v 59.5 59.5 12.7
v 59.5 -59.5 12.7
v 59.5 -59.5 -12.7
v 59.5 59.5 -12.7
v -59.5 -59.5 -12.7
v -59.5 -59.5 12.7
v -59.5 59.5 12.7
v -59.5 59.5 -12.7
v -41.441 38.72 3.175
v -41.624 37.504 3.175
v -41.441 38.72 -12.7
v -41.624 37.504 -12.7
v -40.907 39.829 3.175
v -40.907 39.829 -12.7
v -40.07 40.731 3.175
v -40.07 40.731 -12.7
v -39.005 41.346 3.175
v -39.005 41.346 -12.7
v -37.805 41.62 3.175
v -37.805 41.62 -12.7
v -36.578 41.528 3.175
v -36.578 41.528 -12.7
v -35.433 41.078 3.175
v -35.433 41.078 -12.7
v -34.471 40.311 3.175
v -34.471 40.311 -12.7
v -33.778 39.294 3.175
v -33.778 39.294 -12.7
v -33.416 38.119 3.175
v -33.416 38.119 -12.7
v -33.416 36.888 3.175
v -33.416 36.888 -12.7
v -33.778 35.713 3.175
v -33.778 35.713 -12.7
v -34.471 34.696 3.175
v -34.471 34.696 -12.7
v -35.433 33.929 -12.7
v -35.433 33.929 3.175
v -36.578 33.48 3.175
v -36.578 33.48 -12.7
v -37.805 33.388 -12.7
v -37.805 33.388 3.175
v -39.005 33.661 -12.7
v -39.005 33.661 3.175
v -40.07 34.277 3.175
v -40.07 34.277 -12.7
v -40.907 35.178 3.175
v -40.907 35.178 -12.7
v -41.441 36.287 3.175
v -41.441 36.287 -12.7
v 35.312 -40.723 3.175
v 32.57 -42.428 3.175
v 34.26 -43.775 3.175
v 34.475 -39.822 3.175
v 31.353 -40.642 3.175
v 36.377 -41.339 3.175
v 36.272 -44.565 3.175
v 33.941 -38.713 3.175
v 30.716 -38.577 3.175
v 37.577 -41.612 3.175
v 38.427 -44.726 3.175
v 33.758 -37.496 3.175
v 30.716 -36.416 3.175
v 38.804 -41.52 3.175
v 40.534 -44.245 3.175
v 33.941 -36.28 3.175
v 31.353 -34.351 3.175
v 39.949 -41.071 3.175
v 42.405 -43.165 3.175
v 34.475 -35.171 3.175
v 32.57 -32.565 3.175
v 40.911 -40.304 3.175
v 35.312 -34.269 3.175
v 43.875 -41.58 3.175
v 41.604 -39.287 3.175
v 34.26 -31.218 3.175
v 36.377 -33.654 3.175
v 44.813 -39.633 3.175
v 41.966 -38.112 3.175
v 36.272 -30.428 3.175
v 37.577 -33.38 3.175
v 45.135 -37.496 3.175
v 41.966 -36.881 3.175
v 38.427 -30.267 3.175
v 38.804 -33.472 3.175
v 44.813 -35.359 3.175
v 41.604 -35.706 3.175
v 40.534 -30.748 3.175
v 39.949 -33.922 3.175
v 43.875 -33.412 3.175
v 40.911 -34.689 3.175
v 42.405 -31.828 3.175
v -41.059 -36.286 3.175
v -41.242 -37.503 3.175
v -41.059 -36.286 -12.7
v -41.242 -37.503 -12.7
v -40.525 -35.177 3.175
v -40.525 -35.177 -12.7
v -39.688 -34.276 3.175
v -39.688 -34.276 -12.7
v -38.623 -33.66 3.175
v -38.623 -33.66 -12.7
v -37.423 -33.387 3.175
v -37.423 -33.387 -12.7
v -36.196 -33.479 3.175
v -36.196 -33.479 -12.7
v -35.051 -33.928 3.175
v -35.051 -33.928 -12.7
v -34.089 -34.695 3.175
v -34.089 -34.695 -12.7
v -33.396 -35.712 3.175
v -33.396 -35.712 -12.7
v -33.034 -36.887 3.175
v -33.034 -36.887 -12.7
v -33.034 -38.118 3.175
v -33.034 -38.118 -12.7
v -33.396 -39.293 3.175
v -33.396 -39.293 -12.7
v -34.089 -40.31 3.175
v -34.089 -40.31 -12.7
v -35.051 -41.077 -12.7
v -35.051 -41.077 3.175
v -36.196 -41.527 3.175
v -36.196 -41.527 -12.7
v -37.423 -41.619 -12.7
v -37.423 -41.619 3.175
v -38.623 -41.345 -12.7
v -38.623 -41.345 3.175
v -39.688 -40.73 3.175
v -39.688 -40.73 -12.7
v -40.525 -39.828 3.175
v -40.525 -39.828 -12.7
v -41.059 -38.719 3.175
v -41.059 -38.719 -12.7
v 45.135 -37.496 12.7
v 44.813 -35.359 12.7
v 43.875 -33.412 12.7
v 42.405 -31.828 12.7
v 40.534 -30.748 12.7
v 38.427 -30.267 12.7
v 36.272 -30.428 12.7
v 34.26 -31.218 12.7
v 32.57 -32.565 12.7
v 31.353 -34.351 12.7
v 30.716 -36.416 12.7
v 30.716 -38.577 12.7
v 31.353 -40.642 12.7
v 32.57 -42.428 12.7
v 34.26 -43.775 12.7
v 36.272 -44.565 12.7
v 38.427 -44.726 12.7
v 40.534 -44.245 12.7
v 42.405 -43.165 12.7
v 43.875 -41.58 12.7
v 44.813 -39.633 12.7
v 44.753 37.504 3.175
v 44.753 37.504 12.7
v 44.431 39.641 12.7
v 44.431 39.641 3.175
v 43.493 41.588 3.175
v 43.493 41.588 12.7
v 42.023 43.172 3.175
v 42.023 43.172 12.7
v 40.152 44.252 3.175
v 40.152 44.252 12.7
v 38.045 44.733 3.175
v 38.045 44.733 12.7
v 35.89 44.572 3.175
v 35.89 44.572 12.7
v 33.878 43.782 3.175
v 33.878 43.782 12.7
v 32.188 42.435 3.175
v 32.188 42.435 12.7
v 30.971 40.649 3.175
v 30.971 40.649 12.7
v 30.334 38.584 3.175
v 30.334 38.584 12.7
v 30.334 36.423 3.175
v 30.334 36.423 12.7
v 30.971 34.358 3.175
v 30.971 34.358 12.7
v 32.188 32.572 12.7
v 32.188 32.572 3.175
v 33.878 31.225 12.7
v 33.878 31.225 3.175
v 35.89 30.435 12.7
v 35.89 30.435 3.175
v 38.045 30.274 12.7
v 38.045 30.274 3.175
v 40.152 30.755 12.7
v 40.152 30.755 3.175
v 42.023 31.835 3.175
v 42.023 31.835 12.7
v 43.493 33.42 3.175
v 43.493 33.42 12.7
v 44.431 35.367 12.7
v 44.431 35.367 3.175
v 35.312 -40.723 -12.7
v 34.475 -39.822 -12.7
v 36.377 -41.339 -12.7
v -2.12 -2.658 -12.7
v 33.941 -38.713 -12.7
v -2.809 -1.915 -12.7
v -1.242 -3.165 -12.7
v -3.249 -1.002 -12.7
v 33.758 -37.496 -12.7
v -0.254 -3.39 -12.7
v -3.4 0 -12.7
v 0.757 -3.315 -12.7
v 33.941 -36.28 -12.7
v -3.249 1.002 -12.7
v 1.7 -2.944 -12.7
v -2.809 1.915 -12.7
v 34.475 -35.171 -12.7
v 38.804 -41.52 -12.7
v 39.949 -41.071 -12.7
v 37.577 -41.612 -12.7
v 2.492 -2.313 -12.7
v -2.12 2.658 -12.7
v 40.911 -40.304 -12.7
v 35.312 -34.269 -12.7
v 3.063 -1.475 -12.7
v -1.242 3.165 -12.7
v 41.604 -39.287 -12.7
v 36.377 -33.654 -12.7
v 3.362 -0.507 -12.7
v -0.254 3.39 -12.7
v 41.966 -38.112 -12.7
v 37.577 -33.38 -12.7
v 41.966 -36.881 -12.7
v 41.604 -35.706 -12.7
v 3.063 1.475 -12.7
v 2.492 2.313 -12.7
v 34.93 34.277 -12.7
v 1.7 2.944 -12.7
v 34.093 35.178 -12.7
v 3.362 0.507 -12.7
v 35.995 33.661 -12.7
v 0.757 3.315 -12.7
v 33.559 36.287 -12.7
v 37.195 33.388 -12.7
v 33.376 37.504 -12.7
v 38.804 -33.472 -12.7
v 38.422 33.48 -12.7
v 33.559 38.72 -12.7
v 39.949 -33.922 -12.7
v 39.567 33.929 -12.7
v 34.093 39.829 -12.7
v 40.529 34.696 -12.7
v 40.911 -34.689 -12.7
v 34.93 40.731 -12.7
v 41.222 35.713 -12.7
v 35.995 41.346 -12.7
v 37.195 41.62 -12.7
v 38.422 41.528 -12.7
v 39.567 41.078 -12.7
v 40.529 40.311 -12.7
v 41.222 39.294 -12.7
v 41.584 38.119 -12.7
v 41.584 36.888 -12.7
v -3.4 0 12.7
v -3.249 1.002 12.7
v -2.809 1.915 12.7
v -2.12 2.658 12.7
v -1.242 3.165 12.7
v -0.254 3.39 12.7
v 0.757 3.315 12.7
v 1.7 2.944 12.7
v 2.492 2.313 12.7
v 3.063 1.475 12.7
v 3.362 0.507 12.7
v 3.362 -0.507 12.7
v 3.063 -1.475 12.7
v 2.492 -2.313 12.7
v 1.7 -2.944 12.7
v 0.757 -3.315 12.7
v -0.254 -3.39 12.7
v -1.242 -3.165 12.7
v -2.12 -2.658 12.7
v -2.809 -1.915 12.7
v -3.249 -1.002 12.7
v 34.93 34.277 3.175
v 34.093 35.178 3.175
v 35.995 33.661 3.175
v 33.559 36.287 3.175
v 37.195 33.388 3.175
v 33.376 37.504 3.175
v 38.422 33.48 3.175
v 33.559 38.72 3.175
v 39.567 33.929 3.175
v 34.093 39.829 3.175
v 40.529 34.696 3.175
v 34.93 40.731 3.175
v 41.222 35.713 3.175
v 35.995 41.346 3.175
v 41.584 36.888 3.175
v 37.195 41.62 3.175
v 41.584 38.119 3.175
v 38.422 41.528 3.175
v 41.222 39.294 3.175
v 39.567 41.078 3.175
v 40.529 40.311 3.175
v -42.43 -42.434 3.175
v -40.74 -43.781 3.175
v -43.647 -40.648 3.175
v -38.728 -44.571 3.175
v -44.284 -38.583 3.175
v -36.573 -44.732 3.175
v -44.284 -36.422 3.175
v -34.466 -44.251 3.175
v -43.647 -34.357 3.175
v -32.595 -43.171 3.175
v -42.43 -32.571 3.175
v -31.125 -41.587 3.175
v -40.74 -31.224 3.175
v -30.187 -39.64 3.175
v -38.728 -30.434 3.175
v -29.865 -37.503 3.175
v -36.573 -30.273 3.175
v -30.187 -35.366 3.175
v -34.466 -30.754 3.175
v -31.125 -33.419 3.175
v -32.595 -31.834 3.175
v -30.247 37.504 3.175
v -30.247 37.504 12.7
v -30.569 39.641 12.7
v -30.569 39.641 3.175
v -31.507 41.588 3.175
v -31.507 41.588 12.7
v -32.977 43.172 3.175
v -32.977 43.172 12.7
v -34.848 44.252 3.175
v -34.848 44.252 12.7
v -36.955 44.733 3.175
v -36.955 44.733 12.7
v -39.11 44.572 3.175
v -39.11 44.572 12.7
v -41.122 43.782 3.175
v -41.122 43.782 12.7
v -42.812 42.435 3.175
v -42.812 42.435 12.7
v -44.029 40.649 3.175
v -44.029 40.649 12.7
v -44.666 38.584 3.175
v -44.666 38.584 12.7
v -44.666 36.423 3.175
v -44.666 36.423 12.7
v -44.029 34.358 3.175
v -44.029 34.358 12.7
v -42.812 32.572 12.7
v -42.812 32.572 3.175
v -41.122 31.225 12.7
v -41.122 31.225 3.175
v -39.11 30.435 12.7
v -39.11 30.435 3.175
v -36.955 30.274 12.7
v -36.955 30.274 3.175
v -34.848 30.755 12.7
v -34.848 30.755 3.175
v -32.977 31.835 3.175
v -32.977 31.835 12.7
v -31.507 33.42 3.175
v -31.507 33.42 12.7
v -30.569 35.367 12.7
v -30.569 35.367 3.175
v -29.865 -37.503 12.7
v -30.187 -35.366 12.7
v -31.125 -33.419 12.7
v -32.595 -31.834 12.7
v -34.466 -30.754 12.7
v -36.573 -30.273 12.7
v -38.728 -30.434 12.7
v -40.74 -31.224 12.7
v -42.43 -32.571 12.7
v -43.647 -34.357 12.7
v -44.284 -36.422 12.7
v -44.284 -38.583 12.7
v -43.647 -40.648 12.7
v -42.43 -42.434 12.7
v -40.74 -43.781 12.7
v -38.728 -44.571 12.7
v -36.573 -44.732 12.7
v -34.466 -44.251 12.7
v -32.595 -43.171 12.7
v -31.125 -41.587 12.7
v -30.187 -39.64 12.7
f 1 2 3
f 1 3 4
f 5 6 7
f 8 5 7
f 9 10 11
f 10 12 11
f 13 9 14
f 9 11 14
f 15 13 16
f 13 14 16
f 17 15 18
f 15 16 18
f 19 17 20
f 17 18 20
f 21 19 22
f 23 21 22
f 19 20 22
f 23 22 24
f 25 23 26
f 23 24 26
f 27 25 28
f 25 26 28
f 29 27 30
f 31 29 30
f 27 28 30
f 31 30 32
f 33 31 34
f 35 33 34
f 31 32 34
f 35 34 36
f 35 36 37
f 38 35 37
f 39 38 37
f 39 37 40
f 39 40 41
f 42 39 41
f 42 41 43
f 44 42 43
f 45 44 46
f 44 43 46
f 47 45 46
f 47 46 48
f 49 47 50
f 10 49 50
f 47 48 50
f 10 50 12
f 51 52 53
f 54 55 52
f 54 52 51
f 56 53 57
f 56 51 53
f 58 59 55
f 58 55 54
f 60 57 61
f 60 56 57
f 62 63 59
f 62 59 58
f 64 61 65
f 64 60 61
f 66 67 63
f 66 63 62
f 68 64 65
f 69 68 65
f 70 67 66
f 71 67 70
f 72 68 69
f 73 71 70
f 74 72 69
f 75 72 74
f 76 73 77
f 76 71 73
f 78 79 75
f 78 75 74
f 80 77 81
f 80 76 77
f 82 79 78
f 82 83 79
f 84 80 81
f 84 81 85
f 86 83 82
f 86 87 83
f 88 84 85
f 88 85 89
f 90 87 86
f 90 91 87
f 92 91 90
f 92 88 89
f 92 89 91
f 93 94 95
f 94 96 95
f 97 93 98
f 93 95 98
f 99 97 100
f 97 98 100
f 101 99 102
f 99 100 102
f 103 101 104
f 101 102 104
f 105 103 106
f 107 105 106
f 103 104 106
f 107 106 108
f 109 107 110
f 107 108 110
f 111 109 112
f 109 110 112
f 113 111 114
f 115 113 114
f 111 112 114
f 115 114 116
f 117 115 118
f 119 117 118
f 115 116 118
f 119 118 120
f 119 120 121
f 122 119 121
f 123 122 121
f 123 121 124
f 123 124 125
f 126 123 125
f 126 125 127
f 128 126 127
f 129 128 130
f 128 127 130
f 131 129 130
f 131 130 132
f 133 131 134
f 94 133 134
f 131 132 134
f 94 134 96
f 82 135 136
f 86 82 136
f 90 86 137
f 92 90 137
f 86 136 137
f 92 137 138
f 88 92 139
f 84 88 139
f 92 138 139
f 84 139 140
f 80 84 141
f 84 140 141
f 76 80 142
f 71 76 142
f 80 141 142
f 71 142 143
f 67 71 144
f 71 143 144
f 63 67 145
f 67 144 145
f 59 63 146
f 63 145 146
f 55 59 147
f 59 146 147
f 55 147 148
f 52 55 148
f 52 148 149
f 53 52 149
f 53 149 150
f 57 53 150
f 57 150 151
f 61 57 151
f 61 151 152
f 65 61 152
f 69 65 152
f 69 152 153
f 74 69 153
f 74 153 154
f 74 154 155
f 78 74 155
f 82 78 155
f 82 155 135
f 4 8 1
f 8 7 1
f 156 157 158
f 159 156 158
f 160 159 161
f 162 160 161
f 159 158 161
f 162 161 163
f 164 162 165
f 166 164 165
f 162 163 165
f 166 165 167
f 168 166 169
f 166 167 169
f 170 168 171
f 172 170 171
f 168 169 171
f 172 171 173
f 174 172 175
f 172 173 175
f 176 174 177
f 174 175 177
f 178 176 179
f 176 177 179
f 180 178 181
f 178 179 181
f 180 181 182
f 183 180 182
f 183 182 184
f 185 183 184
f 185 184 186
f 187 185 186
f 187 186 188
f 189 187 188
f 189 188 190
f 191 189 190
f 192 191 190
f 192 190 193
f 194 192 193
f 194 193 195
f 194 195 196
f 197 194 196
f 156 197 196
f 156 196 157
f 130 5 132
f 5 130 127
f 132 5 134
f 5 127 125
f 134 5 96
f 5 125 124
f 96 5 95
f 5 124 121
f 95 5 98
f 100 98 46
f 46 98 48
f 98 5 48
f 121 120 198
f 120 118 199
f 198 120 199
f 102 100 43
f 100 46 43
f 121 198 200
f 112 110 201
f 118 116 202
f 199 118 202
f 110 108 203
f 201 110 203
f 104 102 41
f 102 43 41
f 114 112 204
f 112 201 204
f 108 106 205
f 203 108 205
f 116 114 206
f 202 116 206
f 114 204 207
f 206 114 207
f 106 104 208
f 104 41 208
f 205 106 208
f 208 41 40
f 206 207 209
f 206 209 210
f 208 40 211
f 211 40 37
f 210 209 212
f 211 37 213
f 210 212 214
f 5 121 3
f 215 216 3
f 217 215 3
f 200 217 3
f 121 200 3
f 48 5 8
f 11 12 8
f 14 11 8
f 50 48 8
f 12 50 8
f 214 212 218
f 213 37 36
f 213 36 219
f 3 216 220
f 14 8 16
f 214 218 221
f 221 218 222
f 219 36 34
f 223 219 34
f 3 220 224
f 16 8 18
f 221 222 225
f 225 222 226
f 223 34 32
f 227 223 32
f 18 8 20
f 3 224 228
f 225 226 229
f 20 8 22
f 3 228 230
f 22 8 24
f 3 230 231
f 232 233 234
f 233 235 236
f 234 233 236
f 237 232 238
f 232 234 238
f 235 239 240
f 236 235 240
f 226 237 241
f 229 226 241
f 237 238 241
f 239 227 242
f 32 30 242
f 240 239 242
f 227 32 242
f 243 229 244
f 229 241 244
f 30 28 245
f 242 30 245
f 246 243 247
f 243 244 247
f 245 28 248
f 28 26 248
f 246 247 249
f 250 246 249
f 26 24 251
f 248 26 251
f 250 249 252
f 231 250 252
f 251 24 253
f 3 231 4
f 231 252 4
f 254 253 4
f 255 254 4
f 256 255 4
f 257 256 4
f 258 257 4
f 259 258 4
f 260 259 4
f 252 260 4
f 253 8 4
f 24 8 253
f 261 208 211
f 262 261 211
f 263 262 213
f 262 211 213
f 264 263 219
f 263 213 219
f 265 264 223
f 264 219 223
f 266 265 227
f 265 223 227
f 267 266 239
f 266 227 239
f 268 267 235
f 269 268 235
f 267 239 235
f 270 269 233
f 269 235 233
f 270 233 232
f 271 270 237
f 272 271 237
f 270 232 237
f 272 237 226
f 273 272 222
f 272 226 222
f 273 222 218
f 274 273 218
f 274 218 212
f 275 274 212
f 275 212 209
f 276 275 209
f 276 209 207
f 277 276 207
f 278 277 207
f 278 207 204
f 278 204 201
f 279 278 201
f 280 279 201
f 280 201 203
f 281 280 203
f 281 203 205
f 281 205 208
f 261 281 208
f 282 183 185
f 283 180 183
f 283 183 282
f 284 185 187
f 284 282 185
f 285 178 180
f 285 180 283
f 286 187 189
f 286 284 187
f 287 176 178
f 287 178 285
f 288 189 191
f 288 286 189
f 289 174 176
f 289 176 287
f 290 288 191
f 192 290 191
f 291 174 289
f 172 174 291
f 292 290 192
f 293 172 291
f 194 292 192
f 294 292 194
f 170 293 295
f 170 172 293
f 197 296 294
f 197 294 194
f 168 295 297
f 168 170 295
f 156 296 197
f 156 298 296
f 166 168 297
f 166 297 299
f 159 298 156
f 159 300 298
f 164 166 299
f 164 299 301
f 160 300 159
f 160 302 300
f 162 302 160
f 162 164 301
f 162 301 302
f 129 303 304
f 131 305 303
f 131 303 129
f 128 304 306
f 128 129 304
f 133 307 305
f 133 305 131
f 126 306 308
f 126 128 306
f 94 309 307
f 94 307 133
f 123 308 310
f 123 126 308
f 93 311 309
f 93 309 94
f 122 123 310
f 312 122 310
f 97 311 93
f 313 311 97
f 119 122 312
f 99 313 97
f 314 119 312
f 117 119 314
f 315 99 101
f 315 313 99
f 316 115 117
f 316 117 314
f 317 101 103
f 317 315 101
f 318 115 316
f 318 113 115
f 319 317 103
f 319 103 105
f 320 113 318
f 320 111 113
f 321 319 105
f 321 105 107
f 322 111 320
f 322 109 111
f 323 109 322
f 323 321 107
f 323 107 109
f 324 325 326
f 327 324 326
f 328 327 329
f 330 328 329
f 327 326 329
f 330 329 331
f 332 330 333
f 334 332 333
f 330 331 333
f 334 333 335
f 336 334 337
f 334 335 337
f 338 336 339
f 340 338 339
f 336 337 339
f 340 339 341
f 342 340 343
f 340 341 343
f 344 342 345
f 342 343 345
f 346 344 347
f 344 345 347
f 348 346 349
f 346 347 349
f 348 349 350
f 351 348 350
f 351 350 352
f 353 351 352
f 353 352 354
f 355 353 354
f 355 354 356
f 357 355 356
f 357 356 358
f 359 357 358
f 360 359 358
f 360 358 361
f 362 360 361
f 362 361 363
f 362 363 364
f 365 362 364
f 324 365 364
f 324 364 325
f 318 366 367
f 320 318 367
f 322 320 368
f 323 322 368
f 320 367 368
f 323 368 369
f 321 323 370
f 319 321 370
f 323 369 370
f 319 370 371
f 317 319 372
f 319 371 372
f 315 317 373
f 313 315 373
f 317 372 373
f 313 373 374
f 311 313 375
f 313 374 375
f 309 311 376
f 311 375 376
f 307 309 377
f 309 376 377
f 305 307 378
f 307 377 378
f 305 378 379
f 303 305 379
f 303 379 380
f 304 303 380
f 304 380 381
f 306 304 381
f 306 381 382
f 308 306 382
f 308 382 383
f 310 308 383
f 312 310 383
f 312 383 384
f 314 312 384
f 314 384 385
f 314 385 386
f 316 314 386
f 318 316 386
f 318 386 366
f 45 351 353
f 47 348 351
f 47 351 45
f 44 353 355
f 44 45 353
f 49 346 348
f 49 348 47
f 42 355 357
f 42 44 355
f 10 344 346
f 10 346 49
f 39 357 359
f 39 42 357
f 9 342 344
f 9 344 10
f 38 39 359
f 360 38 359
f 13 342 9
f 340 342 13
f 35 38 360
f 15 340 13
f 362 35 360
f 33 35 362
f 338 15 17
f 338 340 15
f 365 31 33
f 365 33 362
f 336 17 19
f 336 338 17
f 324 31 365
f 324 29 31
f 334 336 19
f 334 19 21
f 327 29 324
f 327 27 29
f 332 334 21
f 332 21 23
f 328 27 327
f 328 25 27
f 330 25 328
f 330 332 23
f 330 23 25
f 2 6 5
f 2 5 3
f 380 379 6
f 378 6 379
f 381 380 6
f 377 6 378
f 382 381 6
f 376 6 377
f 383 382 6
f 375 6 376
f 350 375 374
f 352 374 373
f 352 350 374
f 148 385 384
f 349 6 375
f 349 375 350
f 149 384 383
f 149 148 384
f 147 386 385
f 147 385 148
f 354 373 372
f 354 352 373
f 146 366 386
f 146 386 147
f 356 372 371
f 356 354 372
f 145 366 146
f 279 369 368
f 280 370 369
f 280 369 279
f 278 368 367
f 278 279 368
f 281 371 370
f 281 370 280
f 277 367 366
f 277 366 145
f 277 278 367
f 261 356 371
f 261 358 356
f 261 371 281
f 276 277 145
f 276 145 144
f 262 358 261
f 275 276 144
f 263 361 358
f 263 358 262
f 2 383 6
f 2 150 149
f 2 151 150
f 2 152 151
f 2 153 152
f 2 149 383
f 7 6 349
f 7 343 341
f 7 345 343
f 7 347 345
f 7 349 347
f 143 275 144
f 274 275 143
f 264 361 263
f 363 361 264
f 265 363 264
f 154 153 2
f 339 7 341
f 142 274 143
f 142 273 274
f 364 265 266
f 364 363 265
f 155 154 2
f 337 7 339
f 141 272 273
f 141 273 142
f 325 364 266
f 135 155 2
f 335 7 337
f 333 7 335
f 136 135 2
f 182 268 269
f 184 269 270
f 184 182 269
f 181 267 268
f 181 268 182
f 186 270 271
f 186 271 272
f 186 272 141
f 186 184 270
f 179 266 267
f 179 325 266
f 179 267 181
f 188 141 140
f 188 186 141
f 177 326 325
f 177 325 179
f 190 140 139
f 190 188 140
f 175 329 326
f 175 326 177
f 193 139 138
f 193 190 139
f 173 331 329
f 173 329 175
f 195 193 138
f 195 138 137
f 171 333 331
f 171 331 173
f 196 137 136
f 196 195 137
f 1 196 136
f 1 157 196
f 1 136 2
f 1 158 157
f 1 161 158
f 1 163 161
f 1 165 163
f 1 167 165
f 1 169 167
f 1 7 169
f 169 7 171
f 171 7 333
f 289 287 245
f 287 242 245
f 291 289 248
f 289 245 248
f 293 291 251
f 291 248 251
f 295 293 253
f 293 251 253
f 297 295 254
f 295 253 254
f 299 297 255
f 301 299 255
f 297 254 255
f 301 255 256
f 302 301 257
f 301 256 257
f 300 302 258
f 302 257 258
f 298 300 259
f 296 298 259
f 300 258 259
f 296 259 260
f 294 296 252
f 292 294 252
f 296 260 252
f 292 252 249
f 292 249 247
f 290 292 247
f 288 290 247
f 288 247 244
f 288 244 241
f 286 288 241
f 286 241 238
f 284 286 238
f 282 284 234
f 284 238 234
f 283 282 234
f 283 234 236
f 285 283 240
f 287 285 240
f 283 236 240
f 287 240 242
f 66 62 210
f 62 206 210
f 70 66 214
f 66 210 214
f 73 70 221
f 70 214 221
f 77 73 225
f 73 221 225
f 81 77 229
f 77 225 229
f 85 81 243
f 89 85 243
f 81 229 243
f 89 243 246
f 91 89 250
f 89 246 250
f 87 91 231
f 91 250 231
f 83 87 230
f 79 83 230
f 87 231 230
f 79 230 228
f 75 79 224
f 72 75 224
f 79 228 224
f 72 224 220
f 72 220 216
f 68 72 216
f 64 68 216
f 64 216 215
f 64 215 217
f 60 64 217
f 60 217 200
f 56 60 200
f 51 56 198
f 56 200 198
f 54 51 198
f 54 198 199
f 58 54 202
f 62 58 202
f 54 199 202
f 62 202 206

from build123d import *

# Parameters (mm, degrees)
F0_W           = 118.999
F0_H           = 119
F1_DEPTH       = 12.7
F3_D           = 8.255
F3_CBORE_D     = 14.5
F3_CBORE_DEPTH = 9.525
F5_D           = 6.8


with BuildPart() as f1:
    # F0 (on Top) → F1 (new body, symmetric)
    with BuildSketch(Plane.XY):
        Rectangle(F0_W, F0_H)
    extrude(amount=F1_DEPTH, both=True)

    # F3 (through all)
    with Locations(Plane.XY.offset(12.7)):
        with Locations((-37.1149003506, -37.5026), (-37.4969, 37.5036), (37.5031, 37.5036), (37.8850996494, -37.4964)):
            CounterBoreHole(F3_D / 2, F3_CBORE_D / 2, F3_CBORE_DEPTH)

    # F5 (through all)
    with Locations(Plane.XY.offset(12.7)):
        with Locations((0, 0)):
            Hole(F5_D / 2)


solid = f1.part
